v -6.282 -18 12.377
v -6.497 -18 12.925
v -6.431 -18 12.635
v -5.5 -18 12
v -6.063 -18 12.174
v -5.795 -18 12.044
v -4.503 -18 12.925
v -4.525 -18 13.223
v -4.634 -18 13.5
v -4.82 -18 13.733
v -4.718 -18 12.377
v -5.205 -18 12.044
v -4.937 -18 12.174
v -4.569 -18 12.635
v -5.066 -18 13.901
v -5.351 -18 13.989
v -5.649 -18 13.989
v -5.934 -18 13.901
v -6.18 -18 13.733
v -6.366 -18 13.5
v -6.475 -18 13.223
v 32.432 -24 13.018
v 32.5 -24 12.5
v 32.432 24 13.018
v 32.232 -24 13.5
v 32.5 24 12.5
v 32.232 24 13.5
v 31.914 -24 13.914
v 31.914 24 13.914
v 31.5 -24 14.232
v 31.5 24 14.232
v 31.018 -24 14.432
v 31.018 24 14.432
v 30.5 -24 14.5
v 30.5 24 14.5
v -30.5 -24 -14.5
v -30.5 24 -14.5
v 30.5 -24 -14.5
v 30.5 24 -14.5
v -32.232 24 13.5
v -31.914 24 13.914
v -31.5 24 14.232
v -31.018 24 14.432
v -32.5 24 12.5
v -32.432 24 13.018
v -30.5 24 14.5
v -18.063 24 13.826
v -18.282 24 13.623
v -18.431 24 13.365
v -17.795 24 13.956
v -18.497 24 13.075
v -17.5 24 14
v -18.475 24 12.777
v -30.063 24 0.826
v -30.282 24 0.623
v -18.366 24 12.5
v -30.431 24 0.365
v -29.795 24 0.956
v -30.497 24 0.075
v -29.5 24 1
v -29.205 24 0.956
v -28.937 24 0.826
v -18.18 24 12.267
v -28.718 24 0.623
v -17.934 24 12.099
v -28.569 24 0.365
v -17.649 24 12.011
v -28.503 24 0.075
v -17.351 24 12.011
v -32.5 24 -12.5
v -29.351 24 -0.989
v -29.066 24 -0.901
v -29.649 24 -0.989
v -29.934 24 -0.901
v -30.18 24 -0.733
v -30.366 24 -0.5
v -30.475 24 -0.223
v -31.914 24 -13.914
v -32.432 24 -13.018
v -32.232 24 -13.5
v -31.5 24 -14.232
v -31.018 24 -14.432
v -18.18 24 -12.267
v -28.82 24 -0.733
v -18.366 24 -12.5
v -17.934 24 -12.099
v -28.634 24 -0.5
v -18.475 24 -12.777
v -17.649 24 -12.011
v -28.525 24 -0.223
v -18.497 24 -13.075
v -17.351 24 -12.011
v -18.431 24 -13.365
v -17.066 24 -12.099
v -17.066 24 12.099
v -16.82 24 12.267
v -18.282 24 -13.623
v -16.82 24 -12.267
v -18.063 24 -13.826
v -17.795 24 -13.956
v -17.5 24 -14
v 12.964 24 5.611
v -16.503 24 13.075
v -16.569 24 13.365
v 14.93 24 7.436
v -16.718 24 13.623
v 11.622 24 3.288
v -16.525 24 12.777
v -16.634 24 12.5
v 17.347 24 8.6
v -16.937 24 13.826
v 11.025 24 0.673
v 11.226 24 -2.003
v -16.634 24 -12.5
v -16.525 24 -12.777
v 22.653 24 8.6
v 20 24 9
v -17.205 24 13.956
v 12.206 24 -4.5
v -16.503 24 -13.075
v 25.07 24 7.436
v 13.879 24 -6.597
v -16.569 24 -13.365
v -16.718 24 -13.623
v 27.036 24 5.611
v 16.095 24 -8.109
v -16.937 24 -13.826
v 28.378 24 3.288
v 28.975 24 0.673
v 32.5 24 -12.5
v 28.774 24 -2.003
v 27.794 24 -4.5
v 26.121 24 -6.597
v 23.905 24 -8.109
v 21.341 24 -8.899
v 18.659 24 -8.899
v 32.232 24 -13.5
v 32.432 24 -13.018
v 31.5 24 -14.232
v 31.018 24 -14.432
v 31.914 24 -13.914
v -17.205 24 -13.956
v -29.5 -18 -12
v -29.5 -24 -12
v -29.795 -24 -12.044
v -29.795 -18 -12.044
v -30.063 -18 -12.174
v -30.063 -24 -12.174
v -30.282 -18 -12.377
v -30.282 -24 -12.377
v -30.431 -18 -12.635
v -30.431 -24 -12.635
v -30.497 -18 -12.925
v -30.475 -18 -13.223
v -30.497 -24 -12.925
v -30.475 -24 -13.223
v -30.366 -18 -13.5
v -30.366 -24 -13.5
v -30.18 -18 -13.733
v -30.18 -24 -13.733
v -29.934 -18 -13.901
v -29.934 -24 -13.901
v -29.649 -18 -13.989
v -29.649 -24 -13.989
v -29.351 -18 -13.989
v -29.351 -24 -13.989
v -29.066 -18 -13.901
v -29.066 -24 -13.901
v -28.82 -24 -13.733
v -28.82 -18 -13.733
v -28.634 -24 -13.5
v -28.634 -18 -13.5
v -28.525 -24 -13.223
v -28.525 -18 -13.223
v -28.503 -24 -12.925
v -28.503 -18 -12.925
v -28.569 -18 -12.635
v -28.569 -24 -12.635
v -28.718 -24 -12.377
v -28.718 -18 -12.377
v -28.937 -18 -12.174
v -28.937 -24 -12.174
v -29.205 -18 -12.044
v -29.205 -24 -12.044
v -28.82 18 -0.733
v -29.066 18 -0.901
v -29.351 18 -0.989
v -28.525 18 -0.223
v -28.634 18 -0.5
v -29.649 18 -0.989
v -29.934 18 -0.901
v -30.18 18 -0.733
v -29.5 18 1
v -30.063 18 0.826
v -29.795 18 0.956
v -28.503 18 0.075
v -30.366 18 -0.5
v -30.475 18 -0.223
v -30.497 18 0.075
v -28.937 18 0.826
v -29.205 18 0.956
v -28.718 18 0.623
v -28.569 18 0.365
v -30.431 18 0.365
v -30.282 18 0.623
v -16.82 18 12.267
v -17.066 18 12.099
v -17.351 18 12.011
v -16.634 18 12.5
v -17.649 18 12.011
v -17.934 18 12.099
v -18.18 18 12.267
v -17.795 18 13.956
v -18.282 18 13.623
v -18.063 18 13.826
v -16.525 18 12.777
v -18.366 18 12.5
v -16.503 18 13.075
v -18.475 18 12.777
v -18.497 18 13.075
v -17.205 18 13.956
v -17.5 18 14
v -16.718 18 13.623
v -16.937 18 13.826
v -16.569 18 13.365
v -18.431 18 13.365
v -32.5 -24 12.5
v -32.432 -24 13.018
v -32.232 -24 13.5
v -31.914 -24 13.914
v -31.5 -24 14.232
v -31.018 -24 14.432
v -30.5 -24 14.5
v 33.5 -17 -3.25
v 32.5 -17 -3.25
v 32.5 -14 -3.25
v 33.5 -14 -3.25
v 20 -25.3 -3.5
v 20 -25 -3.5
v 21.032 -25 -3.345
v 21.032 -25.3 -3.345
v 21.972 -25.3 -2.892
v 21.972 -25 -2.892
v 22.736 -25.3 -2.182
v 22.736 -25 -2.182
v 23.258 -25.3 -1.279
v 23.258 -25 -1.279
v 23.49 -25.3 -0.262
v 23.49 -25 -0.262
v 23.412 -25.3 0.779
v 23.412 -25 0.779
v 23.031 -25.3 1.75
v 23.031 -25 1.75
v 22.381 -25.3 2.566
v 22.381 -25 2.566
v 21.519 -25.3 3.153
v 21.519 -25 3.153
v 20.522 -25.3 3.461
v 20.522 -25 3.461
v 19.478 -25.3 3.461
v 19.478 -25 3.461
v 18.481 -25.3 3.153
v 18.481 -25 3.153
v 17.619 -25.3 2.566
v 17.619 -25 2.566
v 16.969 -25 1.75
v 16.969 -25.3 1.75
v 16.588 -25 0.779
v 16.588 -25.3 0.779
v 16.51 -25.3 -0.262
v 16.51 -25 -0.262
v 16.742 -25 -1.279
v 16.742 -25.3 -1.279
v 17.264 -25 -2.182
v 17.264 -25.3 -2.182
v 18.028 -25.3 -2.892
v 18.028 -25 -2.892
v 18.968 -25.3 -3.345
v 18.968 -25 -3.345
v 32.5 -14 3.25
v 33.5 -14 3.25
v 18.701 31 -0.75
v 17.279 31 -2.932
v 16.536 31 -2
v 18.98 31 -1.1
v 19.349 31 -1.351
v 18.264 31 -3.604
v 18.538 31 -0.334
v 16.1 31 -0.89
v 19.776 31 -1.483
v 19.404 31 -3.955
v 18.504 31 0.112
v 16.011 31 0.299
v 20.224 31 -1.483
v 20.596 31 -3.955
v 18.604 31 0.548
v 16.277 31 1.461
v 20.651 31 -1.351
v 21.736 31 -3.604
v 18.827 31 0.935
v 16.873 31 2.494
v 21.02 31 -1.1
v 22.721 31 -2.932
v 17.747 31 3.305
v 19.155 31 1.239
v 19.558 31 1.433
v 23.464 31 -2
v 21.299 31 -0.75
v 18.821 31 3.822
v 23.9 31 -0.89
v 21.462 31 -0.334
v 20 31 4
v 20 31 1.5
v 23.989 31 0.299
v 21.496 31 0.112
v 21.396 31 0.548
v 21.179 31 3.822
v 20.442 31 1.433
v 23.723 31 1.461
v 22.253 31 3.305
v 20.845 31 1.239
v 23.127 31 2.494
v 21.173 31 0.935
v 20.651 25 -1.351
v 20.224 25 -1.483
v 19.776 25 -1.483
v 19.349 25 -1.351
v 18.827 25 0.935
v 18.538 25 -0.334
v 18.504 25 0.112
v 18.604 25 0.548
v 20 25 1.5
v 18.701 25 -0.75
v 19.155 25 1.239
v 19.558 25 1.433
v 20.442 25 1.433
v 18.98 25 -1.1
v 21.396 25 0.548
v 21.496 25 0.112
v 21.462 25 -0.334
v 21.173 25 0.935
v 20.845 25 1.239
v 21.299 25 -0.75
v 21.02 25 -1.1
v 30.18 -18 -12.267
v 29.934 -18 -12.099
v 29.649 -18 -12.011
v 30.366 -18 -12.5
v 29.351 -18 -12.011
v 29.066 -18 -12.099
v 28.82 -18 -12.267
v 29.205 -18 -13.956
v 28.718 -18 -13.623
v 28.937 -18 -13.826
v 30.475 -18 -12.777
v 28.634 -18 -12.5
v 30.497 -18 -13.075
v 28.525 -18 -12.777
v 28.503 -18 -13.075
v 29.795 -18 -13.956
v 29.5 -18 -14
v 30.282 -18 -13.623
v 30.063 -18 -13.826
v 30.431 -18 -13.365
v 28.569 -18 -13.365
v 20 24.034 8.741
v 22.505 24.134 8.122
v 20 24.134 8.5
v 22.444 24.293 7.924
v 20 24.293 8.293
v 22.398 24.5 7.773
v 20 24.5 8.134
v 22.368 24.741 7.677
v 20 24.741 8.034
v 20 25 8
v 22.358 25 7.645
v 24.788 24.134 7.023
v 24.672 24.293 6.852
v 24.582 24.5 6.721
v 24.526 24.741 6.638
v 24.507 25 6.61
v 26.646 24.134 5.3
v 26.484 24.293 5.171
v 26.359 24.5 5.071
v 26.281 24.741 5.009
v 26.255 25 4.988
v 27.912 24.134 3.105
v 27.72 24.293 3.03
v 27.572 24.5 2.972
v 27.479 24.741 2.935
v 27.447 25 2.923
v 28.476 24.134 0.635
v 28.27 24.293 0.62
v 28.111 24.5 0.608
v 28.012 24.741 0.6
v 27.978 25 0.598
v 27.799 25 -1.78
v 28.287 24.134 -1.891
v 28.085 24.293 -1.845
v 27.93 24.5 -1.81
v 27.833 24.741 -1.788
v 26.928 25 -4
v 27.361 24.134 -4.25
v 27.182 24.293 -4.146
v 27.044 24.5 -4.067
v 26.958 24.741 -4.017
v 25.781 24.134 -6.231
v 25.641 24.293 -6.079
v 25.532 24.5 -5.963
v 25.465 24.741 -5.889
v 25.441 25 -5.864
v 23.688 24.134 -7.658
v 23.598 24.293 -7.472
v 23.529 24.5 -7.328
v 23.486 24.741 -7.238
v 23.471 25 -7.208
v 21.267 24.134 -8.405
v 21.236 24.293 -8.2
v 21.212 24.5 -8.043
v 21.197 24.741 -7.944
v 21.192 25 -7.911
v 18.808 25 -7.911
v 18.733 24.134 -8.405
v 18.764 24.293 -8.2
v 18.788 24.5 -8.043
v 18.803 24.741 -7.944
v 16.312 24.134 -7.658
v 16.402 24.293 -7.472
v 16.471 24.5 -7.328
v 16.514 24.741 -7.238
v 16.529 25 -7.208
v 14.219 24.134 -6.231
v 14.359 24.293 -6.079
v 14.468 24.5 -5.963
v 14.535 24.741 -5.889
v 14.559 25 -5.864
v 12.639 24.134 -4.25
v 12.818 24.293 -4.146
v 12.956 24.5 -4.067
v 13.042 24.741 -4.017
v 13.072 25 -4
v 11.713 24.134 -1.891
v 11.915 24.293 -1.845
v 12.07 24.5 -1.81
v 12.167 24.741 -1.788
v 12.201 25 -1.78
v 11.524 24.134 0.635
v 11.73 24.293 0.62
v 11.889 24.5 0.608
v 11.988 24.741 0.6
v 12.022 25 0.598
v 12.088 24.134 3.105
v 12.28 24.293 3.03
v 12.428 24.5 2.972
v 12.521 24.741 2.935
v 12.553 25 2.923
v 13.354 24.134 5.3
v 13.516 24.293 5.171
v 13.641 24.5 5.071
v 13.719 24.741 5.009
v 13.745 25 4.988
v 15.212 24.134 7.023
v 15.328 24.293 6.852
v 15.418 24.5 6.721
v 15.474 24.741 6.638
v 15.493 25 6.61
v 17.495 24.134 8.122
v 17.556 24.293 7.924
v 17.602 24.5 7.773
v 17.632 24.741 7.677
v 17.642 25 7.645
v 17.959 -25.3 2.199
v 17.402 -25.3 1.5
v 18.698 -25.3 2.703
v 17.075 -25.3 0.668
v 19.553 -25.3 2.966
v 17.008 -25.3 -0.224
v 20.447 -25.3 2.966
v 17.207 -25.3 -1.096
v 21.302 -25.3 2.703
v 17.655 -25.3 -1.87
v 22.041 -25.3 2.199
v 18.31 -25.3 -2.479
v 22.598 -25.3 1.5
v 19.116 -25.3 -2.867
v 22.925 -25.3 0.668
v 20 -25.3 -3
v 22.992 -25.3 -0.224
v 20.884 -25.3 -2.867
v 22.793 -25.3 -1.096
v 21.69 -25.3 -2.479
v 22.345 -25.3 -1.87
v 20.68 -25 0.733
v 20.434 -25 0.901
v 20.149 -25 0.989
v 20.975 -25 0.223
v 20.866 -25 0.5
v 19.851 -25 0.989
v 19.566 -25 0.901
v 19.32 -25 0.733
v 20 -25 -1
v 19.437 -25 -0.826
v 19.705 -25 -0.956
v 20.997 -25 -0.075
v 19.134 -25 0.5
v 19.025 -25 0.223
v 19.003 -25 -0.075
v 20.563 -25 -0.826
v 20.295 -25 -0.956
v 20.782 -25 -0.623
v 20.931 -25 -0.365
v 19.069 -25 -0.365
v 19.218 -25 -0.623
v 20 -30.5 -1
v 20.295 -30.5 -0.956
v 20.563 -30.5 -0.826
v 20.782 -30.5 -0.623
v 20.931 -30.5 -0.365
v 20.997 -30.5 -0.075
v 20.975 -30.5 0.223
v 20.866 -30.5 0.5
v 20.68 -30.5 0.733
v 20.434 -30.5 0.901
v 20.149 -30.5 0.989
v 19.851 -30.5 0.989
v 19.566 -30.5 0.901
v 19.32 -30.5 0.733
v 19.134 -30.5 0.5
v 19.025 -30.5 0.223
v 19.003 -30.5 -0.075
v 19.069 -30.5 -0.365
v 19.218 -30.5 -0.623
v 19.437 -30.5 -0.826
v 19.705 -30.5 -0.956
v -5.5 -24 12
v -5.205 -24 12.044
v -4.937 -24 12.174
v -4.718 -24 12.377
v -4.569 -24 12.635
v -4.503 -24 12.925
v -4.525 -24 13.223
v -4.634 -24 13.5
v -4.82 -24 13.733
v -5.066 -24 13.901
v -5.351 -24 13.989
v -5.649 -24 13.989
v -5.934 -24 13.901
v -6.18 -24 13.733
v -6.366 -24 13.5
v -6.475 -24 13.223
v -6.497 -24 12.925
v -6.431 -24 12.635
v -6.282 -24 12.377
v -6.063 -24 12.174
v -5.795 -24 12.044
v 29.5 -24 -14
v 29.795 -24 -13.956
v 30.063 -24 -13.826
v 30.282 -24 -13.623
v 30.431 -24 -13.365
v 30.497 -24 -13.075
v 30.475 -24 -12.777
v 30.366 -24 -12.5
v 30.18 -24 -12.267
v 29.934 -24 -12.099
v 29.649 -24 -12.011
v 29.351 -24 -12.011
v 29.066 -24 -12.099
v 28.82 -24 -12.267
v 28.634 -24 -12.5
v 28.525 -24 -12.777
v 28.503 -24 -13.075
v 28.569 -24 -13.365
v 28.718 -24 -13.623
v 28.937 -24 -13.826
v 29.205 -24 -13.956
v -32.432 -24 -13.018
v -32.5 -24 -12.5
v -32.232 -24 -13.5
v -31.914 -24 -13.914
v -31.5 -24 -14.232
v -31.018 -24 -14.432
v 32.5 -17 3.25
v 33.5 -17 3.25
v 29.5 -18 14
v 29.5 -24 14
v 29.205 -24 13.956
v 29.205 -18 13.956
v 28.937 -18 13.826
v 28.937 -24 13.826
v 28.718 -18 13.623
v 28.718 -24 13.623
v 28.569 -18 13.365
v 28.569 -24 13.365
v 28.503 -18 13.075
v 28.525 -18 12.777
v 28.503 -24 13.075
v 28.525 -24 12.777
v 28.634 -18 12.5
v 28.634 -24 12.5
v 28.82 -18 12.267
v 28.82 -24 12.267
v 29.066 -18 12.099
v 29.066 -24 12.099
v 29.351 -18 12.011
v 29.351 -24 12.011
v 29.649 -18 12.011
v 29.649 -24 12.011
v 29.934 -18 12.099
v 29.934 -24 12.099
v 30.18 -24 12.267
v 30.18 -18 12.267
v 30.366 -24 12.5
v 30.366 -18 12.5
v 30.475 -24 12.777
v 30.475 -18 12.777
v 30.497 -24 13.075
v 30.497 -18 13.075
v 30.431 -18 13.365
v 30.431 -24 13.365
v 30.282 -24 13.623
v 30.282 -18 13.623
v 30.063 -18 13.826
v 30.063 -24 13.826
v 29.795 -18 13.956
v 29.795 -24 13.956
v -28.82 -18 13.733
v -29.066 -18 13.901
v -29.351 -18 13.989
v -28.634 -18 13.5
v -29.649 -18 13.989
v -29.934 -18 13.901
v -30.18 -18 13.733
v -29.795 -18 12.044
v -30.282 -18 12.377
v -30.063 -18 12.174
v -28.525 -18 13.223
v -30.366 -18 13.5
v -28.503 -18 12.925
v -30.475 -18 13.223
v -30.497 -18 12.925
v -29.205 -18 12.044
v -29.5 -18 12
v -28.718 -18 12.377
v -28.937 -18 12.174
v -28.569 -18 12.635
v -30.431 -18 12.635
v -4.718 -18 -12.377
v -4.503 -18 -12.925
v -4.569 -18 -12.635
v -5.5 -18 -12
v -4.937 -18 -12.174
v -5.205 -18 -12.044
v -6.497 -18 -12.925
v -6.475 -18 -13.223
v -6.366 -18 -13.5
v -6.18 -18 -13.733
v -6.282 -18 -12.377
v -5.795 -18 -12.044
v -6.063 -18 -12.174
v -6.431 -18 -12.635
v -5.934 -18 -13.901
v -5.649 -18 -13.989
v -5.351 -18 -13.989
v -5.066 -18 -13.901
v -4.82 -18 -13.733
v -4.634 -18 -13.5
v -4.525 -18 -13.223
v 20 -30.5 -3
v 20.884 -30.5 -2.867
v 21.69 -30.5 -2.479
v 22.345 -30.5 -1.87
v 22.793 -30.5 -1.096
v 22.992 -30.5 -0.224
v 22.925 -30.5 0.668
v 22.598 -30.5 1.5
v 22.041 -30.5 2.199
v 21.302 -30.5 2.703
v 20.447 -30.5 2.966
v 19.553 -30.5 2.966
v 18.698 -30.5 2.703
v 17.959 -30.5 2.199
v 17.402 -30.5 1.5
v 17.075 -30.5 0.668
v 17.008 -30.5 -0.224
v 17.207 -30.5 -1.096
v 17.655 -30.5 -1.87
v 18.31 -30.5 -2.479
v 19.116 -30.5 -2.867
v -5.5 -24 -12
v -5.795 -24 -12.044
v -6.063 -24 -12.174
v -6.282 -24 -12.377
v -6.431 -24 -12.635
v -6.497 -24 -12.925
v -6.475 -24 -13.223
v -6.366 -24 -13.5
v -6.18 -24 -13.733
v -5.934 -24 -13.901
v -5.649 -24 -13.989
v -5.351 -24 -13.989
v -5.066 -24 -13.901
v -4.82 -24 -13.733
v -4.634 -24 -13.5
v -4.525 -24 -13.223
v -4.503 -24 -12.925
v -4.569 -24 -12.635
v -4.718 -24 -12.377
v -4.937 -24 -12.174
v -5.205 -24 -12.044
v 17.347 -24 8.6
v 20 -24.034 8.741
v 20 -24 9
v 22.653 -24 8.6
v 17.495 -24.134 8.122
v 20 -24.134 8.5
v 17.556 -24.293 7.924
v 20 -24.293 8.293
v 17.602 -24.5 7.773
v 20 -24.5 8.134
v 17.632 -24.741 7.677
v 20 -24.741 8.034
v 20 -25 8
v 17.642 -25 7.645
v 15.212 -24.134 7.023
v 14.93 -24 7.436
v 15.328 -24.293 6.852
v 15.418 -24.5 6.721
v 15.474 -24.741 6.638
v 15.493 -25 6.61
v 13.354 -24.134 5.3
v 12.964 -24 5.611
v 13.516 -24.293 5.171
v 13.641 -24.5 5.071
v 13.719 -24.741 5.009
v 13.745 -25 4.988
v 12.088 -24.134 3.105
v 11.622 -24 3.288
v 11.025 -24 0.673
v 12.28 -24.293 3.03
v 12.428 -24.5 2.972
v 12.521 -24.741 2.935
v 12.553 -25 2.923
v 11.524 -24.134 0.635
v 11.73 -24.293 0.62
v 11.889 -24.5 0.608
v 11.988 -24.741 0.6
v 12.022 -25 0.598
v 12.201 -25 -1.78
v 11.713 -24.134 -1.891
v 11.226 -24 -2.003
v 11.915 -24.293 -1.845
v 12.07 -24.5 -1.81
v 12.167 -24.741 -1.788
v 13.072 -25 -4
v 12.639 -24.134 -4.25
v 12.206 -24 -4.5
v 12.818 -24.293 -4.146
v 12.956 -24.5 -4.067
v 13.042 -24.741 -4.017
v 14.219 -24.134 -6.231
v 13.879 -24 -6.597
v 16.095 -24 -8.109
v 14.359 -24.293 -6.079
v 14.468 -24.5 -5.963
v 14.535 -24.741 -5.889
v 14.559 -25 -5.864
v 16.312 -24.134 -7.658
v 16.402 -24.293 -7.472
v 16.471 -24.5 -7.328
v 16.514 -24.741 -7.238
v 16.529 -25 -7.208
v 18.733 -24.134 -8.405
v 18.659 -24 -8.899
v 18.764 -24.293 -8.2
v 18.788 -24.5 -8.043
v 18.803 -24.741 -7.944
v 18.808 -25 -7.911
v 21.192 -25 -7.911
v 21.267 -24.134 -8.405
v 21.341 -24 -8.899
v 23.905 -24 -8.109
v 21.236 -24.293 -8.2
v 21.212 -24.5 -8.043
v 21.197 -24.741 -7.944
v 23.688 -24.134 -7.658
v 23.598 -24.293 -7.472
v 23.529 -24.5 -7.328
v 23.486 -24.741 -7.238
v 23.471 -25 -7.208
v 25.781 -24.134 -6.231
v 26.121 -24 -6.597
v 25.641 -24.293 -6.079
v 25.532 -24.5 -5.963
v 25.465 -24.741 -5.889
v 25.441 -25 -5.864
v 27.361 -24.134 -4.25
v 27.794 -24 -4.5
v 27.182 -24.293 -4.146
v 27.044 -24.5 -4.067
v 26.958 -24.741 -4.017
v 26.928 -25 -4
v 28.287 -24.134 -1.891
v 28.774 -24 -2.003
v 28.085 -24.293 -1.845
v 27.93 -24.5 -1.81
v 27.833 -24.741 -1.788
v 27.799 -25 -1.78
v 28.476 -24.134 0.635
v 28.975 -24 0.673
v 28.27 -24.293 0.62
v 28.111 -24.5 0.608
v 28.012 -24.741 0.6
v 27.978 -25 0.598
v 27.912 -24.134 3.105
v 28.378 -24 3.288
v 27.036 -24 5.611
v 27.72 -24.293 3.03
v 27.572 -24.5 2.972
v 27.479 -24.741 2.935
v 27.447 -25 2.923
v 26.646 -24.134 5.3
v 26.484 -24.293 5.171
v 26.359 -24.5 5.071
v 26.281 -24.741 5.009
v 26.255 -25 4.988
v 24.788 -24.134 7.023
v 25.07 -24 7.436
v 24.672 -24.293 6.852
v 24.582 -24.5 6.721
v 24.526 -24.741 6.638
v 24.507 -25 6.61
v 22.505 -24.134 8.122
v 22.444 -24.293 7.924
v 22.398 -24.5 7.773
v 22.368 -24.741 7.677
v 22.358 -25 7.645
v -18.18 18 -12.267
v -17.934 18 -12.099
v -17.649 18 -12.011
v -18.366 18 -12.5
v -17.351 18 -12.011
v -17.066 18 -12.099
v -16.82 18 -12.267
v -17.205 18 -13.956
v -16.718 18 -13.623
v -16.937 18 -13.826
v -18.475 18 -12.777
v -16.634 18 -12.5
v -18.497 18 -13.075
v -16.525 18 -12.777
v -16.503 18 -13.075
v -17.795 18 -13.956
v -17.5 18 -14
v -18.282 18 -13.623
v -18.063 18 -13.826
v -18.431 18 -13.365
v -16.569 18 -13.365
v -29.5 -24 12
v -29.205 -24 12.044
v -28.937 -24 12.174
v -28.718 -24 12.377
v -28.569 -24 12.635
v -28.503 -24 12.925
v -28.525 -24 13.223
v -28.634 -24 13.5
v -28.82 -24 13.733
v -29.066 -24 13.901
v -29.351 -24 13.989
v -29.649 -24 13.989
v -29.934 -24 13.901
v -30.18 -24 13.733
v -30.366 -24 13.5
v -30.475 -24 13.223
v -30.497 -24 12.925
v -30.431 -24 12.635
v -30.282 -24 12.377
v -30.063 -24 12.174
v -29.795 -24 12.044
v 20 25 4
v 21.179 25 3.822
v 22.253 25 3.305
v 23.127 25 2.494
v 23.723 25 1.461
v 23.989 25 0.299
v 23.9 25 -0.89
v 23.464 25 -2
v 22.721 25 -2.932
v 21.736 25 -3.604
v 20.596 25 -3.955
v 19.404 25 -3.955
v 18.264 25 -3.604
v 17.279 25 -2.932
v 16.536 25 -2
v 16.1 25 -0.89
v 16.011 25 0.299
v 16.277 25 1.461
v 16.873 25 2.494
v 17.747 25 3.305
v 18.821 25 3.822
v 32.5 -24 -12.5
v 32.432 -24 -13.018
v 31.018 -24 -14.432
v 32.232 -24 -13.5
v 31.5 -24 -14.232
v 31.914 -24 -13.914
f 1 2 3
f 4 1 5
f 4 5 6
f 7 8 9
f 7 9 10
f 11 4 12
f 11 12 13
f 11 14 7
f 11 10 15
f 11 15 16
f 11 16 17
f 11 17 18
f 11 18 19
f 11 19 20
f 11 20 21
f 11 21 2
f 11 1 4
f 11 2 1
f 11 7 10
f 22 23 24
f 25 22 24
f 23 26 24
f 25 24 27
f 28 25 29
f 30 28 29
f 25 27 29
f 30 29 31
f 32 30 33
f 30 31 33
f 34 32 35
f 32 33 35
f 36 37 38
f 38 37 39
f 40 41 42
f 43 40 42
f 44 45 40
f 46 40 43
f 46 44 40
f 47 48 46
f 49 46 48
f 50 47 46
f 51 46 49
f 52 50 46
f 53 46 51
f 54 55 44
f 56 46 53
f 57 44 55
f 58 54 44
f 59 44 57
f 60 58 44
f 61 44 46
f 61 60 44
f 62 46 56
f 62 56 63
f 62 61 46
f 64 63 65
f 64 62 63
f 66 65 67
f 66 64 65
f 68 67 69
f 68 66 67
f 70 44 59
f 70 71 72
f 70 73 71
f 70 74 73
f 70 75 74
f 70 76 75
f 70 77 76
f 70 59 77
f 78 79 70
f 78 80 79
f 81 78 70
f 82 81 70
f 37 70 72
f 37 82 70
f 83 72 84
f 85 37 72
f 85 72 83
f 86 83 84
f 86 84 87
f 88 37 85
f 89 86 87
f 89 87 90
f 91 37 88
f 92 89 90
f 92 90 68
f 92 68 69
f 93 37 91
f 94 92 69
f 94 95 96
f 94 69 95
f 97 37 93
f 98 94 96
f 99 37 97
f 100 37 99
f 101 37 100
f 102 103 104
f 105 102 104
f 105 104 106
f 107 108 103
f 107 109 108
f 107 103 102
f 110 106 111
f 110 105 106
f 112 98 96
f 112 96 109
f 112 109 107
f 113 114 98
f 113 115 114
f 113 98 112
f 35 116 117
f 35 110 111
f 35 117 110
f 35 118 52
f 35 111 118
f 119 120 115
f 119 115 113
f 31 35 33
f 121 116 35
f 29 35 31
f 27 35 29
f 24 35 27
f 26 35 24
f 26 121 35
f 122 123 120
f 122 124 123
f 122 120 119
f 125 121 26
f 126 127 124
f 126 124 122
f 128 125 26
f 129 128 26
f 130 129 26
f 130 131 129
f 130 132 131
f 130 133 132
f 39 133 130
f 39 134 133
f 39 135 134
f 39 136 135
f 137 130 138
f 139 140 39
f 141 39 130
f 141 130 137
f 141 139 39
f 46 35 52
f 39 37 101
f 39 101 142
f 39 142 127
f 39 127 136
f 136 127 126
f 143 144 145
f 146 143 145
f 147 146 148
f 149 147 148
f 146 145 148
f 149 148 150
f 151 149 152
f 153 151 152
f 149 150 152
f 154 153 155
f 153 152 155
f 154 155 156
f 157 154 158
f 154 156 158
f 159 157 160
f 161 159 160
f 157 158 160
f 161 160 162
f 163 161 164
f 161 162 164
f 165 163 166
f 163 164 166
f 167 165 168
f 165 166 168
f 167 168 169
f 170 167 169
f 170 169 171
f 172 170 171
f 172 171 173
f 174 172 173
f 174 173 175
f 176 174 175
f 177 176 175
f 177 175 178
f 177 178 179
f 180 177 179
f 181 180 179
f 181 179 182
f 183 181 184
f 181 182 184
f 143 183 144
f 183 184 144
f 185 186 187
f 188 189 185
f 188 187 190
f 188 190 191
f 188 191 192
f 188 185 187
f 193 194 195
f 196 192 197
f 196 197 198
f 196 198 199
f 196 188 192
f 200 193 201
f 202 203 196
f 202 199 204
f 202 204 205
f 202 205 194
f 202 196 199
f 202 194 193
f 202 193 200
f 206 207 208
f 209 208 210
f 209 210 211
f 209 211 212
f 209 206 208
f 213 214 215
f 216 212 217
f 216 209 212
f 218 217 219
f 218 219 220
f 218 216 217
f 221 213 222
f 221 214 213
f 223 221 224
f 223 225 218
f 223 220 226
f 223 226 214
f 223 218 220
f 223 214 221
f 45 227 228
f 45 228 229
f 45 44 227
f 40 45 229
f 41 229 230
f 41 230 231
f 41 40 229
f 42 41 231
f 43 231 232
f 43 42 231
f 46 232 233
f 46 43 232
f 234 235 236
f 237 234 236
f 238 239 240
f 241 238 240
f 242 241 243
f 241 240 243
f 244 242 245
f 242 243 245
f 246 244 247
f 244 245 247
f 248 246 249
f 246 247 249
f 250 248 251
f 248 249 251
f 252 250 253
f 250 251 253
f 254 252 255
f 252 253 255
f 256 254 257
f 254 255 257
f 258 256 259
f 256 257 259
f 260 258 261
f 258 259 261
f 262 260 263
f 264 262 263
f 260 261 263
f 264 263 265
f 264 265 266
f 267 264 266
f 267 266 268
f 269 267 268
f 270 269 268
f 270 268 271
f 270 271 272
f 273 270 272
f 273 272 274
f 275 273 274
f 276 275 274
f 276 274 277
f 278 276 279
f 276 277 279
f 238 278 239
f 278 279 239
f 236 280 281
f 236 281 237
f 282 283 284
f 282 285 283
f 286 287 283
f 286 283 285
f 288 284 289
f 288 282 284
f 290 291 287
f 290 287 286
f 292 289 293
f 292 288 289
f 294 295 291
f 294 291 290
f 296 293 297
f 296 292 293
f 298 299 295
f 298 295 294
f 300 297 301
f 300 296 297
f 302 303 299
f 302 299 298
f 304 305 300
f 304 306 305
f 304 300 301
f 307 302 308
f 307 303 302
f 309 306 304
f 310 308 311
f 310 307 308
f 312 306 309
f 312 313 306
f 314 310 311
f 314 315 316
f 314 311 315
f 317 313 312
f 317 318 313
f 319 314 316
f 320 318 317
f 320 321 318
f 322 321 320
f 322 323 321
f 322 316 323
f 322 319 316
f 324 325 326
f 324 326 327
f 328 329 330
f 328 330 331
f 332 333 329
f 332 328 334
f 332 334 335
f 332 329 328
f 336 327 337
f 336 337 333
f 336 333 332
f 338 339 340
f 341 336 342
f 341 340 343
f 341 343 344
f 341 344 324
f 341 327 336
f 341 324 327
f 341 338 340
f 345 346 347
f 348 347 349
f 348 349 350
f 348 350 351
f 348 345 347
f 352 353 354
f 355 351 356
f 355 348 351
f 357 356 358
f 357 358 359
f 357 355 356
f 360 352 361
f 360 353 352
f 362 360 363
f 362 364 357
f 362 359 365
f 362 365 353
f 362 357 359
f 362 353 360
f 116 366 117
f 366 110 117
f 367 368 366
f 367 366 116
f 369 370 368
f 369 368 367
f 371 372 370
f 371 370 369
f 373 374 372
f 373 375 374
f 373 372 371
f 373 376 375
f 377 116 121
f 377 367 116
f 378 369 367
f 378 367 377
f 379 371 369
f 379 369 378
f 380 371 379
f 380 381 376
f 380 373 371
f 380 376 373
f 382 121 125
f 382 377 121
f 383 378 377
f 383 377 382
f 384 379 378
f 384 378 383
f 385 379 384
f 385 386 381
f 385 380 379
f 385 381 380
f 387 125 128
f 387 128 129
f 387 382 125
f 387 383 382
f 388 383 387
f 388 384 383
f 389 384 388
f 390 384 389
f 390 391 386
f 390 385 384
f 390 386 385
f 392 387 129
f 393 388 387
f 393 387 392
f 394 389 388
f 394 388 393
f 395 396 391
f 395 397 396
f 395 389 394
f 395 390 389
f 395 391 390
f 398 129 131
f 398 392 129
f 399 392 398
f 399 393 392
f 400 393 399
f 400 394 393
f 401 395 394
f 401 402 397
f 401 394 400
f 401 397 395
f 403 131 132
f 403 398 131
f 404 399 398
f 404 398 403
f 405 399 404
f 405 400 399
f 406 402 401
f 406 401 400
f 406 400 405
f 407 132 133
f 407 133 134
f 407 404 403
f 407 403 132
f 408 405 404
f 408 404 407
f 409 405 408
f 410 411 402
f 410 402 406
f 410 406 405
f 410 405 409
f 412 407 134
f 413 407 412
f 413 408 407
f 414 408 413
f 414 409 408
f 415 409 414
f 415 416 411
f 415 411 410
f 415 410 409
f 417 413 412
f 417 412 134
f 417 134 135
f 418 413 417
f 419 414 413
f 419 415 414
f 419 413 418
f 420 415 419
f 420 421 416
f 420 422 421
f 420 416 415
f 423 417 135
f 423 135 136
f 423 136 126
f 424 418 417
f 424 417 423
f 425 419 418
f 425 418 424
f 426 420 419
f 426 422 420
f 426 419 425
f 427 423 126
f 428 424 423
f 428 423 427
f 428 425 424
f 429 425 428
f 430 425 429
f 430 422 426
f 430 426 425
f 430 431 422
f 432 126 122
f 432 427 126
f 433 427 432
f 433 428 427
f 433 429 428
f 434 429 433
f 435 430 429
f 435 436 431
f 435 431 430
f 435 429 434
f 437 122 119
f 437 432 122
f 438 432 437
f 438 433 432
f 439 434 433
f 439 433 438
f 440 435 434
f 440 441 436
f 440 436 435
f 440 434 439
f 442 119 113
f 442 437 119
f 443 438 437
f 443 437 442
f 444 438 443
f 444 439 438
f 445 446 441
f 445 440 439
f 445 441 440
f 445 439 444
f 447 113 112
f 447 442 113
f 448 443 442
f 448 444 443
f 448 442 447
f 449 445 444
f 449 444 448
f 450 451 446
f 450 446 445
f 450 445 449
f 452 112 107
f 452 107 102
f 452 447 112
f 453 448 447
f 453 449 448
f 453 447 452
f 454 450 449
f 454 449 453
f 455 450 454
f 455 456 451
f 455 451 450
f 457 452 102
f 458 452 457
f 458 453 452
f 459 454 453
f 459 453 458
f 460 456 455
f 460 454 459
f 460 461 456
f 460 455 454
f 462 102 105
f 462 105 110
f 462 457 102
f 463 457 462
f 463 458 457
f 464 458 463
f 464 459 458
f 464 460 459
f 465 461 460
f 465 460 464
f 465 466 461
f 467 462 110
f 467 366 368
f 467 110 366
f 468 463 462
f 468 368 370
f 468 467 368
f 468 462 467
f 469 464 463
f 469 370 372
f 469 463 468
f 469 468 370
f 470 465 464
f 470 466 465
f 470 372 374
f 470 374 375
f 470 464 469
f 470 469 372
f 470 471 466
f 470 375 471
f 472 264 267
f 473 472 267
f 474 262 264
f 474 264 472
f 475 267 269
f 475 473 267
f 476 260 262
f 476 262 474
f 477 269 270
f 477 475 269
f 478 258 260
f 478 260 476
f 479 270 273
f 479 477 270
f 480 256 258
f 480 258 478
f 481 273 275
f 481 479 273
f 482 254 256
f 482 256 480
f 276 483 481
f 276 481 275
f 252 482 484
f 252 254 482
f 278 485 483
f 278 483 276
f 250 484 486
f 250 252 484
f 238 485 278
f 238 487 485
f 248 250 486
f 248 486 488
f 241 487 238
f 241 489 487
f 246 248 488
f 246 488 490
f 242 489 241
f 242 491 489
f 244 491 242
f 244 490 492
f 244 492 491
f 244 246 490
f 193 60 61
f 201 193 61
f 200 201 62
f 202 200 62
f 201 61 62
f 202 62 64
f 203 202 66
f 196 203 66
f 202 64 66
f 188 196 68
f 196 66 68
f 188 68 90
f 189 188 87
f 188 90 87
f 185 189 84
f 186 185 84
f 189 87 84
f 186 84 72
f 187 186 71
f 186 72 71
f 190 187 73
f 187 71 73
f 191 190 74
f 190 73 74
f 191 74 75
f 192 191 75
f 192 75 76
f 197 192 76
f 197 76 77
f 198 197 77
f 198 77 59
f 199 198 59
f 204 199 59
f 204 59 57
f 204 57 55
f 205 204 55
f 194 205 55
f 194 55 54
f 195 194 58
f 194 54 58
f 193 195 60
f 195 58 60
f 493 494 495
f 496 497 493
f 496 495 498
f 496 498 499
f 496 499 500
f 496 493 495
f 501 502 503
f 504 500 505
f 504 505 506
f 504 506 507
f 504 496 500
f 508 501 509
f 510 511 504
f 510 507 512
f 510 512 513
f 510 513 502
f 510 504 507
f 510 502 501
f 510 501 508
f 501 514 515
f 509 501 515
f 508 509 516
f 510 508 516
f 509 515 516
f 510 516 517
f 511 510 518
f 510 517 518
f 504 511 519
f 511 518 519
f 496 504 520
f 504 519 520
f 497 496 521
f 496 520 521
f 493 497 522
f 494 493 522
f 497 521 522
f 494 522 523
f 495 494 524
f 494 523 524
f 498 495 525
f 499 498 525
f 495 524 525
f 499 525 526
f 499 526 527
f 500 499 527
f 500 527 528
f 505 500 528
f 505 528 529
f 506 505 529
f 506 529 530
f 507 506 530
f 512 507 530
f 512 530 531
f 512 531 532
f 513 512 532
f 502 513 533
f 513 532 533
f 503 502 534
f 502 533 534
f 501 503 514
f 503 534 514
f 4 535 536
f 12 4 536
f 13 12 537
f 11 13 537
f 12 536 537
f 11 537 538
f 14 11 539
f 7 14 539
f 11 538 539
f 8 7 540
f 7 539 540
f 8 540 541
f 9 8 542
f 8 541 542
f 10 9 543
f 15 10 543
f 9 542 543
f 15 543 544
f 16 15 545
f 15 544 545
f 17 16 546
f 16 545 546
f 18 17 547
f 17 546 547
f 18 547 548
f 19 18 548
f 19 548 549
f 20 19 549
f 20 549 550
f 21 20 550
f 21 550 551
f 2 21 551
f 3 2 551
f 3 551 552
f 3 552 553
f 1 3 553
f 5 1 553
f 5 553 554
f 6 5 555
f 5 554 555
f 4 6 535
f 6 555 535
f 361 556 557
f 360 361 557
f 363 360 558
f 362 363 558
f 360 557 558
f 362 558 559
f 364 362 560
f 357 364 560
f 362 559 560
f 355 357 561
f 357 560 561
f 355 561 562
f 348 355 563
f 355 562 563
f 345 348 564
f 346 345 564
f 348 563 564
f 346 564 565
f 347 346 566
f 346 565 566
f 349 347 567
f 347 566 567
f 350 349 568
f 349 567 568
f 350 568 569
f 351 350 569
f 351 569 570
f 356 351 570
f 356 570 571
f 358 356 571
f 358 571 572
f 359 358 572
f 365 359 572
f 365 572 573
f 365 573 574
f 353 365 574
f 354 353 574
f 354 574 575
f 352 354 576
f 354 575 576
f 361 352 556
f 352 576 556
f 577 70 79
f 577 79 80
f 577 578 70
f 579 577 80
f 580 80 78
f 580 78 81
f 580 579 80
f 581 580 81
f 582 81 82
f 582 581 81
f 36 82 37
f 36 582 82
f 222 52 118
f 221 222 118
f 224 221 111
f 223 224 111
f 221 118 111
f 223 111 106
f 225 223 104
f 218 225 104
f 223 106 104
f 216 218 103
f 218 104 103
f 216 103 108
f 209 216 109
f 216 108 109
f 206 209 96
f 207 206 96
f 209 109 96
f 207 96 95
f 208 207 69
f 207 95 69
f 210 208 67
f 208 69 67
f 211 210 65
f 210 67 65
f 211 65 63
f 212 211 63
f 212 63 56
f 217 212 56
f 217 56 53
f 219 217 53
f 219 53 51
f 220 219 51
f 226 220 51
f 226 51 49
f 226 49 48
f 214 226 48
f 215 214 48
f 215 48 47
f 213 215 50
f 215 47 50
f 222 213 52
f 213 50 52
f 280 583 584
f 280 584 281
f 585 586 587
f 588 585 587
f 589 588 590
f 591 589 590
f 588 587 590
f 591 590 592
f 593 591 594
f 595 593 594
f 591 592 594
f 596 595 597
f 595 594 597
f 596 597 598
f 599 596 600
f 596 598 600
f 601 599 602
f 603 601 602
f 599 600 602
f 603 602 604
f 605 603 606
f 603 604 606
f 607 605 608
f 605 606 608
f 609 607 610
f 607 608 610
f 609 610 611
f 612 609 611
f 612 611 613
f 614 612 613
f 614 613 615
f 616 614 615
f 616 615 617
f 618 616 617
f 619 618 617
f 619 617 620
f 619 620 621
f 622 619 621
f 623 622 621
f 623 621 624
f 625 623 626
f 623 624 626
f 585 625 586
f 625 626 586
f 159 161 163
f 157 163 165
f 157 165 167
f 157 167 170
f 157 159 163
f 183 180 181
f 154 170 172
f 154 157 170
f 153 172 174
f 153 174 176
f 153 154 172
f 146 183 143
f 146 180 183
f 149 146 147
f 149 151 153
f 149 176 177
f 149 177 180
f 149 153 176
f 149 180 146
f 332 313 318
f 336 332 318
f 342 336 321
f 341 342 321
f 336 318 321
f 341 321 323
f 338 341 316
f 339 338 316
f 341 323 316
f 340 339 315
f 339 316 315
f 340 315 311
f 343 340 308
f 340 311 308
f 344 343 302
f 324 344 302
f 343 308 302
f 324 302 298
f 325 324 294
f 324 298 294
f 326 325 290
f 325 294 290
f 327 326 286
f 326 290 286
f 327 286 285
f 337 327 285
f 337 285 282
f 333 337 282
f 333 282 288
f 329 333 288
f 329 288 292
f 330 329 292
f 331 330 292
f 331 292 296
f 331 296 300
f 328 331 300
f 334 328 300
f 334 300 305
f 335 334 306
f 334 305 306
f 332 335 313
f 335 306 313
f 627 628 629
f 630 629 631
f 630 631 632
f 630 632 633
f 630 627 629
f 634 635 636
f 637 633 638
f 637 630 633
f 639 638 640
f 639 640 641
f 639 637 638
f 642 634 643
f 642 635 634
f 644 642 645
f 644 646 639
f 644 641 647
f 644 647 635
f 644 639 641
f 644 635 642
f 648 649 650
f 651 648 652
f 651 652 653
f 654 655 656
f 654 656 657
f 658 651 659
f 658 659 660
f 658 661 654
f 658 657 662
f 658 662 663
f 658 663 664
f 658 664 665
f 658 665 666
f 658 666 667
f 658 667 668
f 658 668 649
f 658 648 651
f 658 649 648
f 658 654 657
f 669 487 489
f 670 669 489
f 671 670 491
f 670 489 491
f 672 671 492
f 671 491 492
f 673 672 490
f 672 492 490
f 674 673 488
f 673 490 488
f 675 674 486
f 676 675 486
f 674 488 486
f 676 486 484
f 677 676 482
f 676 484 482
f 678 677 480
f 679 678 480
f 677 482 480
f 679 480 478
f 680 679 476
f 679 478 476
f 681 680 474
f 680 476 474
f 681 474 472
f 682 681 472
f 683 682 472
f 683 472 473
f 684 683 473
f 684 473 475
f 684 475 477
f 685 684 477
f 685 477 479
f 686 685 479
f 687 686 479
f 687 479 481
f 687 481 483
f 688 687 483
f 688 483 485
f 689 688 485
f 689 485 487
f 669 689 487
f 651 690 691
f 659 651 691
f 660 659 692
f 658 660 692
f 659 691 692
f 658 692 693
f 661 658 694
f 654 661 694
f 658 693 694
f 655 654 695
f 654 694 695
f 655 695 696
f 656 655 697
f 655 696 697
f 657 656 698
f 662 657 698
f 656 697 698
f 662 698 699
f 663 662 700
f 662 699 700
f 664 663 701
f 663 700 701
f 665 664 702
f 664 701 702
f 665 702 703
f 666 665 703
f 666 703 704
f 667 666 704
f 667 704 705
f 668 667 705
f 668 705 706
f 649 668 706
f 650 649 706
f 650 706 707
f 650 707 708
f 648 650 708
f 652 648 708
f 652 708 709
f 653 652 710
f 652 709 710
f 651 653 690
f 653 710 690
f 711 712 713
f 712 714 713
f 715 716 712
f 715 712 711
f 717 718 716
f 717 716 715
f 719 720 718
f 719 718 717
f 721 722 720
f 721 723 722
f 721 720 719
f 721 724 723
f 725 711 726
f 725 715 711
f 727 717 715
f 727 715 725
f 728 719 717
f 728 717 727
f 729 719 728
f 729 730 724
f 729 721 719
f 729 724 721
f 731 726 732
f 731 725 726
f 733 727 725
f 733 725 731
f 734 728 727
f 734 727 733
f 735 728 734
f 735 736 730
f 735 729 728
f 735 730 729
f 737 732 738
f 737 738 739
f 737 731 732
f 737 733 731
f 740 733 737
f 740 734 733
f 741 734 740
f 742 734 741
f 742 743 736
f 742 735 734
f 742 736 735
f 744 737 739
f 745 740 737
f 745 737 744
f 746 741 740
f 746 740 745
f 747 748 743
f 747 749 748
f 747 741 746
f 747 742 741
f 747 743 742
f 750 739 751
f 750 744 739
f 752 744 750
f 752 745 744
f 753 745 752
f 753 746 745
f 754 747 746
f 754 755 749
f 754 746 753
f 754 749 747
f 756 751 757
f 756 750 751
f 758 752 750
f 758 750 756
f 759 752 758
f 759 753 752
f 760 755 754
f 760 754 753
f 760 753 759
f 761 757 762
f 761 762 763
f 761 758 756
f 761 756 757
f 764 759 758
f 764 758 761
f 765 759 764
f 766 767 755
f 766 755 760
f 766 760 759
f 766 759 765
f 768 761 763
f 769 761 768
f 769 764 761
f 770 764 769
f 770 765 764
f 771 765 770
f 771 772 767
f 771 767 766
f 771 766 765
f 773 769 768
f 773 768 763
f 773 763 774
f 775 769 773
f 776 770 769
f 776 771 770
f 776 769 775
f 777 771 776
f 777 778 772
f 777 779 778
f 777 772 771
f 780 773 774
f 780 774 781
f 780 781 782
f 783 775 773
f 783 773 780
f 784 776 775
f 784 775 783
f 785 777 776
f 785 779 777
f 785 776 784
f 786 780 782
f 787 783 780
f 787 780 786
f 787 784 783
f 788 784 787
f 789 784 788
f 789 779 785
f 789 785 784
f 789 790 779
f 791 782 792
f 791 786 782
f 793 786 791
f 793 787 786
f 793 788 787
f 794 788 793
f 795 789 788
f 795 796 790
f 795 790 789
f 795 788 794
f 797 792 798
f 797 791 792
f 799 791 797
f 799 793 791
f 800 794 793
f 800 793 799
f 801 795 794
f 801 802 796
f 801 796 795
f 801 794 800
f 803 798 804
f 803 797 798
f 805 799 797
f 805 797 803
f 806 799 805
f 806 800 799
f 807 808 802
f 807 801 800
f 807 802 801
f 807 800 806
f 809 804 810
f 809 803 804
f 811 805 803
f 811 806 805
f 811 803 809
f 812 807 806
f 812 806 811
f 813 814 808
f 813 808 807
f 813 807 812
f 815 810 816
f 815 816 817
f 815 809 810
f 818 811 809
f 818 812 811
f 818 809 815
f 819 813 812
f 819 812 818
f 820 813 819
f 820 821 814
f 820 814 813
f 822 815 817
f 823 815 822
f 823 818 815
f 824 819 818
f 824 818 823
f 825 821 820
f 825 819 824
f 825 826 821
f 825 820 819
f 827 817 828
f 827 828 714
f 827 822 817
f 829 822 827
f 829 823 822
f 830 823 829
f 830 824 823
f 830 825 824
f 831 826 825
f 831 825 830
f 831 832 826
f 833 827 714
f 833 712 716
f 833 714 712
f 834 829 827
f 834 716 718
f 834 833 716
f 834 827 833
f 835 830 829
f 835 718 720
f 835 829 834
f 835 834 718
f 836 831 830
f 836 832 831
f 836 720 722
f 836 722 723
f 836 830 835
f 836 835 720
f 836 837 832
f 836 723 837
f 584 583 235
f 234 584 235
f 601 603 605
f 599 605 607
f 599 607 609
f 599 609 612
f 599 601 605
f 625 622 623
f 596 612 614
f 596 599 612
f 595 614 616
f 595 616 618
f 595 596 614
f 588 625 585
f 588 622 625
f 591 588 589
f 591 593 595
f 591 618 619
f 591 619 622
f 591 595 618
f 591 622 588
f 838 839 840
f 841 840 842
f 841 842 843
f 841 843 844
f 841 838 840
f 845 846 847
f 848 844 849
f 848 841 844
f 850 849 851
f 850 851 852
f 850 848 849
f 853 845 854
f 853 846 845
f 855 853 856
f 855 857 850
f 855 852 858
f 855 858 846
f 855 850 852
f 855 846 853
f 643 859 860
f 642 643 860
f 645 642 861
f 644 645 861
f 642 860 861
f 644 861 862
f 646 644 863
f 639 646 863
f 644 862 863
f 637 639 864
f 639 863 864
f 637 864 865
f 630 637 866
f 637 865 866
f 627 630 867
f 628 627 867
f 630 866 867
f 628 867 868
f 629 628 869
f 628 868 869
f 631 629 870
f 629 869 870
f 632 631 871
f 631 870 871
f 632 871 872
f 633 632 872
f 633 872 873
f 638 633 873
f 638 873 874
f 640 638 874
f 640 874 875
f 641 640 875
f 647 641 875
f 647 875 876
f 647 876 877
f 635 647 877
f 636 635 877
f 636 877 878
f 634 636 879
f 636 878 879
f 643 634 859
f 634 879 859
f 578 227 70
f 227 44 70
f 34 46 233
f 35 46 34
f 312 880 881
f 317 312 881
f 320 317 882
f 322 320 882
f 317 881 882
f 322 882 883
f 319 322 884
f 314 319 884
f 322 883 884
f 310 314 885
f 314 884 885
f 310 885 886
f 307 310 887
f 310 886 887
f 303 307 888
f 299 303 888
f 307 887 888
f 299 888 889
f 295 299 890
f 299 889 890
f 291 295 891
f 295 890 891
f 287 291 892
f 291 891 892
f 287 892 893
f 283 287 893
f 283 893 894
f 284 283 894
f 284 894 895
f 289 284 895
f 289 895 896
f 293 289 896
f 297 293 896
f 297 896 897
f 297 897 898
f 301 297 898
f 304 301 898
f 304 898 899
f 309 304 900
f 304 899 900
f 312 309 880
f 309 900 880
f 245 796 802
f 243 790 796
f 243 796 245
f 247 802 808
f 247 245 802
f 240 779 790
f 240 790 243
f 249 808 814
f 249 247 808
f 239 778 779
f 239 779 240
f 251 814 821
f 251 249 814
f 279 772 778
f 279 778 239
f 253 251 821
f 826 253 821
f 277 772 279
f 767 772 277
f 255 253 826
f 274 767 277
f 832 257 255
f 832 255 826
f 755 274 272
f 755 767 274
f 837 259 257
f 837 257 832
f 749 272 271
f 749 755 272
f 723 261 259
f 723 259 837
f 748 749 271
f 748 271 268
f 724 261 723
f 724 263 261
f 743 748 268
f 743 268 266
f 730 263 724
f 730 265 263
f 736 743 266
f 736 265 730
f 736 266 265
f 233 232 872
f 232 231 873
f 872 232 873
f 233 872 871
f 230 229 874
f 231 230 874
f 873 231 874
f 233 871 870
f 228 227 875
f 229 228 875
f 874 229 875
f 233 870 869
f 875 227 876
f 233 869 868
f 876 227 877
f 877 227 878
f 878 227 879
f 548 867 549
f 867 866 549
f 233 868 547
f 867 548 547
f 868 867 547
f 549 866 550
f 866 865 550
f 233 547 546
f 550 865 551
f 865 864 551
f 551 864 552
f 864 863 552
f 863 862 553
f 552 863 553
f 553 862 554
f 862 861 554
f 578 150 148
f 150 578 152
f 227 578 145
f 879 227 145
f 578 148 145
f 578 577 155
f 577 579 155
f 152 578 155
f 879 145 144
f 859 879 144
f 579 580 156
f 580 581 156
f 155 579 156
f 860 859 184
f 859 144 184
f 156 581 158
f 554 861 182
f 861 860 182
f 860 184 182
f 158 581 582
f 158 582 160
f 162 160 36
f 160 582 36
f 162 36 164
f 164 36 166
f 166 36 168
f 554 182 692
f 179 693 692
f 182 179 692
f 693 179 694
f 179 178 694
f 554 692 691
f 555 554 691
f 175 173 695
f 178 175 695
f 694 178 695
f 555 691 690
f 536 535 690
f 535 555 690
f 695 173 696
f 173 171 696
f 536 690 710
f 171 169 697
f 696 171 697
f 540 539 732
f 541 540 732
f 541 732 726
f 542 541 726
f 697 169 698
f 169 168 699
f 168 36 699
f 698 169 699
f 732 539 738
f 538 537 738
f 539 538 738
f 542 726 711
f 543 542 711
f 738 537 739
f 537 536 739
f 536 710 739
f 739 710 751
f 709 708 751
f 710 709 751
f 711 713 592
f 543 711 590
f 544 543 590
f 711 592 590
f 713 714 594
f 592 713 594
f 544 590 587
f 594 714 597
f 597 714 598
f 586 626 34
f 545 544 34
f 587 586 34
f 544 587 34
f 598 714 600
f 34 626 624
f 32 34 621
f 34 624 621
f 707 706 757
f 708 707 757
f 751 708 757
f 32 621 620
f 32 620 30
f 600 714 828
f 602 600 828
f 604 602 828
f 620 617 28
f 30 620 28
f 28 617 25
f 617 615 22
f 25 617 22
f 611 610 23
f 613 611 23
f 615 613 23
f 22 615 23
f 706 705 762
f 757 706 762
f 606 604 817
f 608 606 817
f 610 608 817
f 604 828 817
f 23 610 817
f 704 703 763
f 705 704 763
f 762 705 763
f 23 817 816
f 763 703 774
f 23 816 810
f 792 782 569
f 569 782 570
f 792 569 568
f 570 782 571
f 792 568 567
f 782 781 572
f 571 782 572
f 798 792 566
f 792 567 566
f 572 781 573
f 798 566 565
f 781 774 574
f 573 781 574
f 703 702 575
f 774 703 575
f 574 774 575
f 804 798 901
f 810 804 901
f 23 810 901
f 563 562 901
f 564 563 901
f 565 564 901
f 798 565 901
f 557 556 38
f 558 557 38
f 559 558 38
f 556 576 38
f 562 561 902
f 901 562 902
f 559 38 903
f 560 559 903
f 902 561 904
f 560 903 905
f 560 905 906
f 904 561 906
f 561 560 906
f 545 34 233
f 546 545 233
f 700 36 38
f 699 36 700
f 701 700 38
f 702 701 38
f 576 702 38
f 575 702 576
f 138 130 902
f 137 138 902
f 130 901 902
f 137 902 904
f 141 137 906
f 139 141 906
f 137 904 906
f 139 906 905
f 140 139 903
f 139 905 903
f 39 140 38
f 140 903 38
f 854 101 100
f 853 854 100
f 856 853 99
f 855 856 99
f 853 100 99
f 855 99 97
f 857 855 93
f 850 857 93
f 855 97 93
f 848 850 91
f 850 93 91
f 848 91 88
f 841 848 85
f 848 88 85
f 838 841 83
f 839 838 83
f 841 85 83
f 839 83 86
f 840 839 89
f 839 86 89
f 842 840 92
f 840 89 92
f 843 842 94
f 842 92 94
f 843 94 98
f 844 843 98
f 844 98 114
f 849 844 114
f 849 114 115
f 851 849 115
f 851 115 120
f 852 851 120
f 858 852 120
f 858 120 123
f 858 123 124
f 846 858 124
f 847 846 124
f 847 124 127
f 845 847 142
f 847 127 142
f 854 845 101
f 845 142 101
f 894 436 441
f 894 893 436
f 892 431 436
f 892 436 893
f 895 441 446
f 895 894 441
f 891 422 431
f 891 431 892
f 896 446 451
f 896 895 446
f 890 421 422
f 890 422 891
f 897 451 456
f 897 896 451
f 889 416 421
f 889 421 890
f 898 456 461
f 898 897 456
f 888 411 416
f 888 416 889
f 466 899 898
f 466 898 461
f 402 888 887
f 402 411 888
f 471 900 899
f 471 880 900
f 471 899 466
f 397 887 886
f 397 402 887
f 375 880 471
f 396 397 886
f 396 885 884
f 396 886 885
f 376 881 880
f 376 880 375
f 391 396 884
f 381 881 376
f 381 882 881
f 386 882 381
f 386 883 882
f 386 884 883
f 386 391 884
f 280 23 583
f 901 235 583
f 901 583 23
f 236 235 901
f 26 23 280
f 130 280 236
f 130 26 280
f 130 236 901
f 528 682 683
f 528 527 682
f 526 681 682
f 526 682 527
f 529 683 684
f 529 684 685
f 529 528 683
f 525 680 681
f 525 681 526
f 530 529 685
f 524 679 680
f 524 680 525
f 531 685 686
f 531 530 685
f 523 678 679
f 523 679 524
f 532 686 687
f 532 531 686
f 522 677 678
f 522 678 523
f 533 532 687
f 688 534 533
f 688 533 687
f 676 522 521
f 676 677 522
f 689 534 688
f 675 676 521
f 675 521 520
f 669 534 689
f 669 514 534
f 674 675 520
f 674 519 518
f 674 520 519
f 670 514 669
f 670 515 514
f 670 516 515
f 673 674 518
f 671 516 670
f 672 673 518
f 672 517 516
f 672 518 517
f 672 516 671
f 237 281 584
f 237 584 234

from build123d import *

# Parameters (mm, degrees)
SKETCH_2_W          = 65
SKETCH_2_H          = 29
EXTRUDE_1_DEPTH     = 24
FILLET_1_R          = 2
SKETCH_3_R          = 1
CUT_EXTRUDE_1_DEPTH = 6
SKETCH_4_R          = 8
EXTRUDE_2_DEPTH     = 1
FILLET_2_R          = 1
SKETCH_5_R          = 4
EXTRUDE_3_DEPTH     = 6
SKETCH_6_R          = 1
CUT_EXTRUDE_2_DEPTH = 6
EXTRUDE_START       = 1
SKETCH_7_R          = 8
EXTRUDE_4_DEPTH     = 1
FILLET_3_R          = 1
SKETCH_8_R          = 3.5
EXTRUDE_5_DEPTH     = 0.3
SKETCH_9_R          = 3
EXTRUDE_6_DEPTH     = 5.5
SKETCH_10_R         = 1
CUT_EXTRUDE_3_DEPTH = 5.5
SKETCH_11_W         = 6.5
SKETCH_11_H         = 3
EXTRUDE_7_DEPTH     = 1
SKETCH_12_R         = 1.5
CUT_EXTRUDE_4_DEPTH = 6


with BuildPart() as part:
    # ｽｹｯﾁ2 → ﾎﾞｽ - 押し出し1 (new, symmetric)
    with BuildSketch(Plane(origin=(0, 0, 0), x_dir=(1, 0, 0), z_dir=(0, 1, 0))):
        Rectangle(SKETCH_2_W, SKETCH_2_H)
    extrude(amount=EXTRUDE_1_DEPTH, both=True)

    # ﾌｨﾚｯﾄ1
    fillet_1_edges = [part.edges().sort_by_distance(p)[0] for p in [
        (32.5, 0, 14.5),
        (-32.5, 0, 14.5),
        (-32.5, 0, -14.5),
        (32.5, 0, -14.5),
    ]]
    fillet(fillet_1_edges, radius=FILLET_1_R)

    # ｽｹｯﾁ3 → ｶｯﾄ - 押し出し1 (cut)
    with BuildSketch(Plane(origin=(0, 24, 0), x_dir=(1, 0, 0), z_dir=(0, 1, 0))):
        with Locations(Location((-29.5, 0, 0), (0, 0, 270))):
            Circle(SKETCH_3_R)
        with Locations(Location((-17.5, -13, 0), (0, 0, 270))):
            Circle(SKETCH_3_R)
        with Locations(Location((-17.5, 13, 0), (0, 0, 90))):
            Circle(SKETCH_3_R)
    extrude(amount=-CUT_EXTRUDE_1_DEPTH, mode=Mode.SUBTRACT)

    # ｽｹｯﾁ4 → ﾎﾞｽ - 押し出し2 (add)
    with BuildSketch(Plane(origin=(0, 24, 0), x_dir=(1, 0, 0), z_dir=(0, 1, 0))):
        with Locations(Location((20, 0, 0), (0, 0, 270))):
            Circle(SKETCH_4_R)
    extrude(amount=EXTRUDE_2_DEPTH)

    # ﾌｨﾚｯﾄ2
    fillet_2_edges = [part.edges().sort_by_distance(p)[0] for p in [
        (20, 24, -8),
    ]]
    fillet(fillet_2_edges, radius=FILLET_2_R - 0.0001)  # a hair under: the kernel refuses the full size

    # ｽｹｯﾁ5 → ﾎﾞｽ - 押し出し3 (add)
    with BuildSketch(Plane(origin=(0, 25, 0), x_dir=(1, 0, 0), z_dir=(0, 1, 0))):
        with Locations(Location((20, 0, 0), (0, 0, 270))):
            Circle(SKETCH_5_R)
    extrude(amount=EXTRUDE_3_DEPTH)

    # ｽｹｯﾁ6 → ｶｯﾄ - 押し出し2 (cut)
    with BuildSketch(Plane.XZ.offset(24)):
        with Locations(Location((-29.5, 13, 0), (0, 0, 270))):
            Circle(SKETCH_6_R)
        with Locations(Location((-29.5, -13, 0), (0, 0, 90))):
            Circle(SKETCH_6_R)
        with Locations(Location((29.5, -13, 0), (0, 0, 270))):
            Circle(SKETCH_6_R)
        with Locations(Location((29.5, 13, 0), (0, 0, 90))):
            Circle(SKETCH_6_R)
        with Locations(Location((-5.5, 13, 0), (0, 0, 270))):
            Circle(SKETCH_6_R)
        with Locations(Location((-5.5, -13, 0), (0, 0, 90))):
            Circle(SKETCH_6_R)
    extrude(amount=-CUT_EXTRUDE_2_DEPTH, mode=Mode.SUBTRACT)

    # ｽｹｯﾁ7 → ﾎﾞｽ - 押し出し4 (add)
    with BuildSketch(Plane.XZ.offset(24).offset(EXTRUDE_START)):
        with Locations(Location((20, 0, 0), (0, 0, 90))):
            Circle(SKETCH_7_R)
    extrude(amount=-EXTRUDE_4_DEPTH)

    # ﾌｨﾚｯﾄ3
    fillet_3_edges = [part.edges().sort_by_distance(p)[0] for p in [
        (20, -24, -8),
    ]]
    fillet(fillet_3_edges, radius=FILLET_3_R - 0.0001)  # a hair under: the kernel refuses the full size

    # ｽｹｯﾁ8 → ﾎﾞｽ - 押し出し5 (add)
    with BuildSketch(Plane.XZ.offset(25)):
        with Locations(Location((20, 0, 0), (0, 0, 270))):
            Circle(SKETCH_8_R)
    extrude(amount=EXTRUDE_5_DEPTH)

    # ｽｹｯﾁ9 → ﾎﾞｽ - 押し出し6 (add)
    with BuildSketch(Plane.XZ.offset(25)):
        with Locations(Location((20, 0, 0), (0, 0, 270))):
            Circle(SKETCH_9_R)
    extrude(amount=EXTRUDE_6_DEPTH)

    # ｽｹｯﾁ10 → ｶｯﾄ - 押し出し3 (cut)
    with BuildSketch(Plane.XZ.offset(30.5)):
        with Locations(Location((20, 0, 0), (0, 0, 270))):
            Circle(SKETCH_10_R)
    extrude(amount=-CUT_EXTRUDE_3_DEPTH, mode=Mode.SUBTRACT)

    # ｽｹｯﾁ11 → ﾎﾞｽ - 押し出し7 (add)
    with BuildSketch(Plane(origin=(32.5, 0, 0), x_dir=(0, 0, -1), z_dir=(1, 0, 0))):
        with Locations((0, -15.5)):
            Rectangle(SKETCH_11_W, SKETCH_11_H)
    extrude(amount=EXTRUDE_7_DEPTH)

    # ｽｹｯﾁ12 → ｶｯﾄ - 押し出し4 (cut)
    with BuildSketch(Plane(origin=(0, 31, 0), x_dir=(1, 0, 0), z_dir=(0, 1, 0))):
        with Locations(Location((20, 0, 0), (0, 0, 270))):
            Circle(SKETCH_12_R)
    extrude(amount=-CUT_EXTRUDE_4_DEPTH, mode=Mode.SUBTRACT)


solid = part.part
